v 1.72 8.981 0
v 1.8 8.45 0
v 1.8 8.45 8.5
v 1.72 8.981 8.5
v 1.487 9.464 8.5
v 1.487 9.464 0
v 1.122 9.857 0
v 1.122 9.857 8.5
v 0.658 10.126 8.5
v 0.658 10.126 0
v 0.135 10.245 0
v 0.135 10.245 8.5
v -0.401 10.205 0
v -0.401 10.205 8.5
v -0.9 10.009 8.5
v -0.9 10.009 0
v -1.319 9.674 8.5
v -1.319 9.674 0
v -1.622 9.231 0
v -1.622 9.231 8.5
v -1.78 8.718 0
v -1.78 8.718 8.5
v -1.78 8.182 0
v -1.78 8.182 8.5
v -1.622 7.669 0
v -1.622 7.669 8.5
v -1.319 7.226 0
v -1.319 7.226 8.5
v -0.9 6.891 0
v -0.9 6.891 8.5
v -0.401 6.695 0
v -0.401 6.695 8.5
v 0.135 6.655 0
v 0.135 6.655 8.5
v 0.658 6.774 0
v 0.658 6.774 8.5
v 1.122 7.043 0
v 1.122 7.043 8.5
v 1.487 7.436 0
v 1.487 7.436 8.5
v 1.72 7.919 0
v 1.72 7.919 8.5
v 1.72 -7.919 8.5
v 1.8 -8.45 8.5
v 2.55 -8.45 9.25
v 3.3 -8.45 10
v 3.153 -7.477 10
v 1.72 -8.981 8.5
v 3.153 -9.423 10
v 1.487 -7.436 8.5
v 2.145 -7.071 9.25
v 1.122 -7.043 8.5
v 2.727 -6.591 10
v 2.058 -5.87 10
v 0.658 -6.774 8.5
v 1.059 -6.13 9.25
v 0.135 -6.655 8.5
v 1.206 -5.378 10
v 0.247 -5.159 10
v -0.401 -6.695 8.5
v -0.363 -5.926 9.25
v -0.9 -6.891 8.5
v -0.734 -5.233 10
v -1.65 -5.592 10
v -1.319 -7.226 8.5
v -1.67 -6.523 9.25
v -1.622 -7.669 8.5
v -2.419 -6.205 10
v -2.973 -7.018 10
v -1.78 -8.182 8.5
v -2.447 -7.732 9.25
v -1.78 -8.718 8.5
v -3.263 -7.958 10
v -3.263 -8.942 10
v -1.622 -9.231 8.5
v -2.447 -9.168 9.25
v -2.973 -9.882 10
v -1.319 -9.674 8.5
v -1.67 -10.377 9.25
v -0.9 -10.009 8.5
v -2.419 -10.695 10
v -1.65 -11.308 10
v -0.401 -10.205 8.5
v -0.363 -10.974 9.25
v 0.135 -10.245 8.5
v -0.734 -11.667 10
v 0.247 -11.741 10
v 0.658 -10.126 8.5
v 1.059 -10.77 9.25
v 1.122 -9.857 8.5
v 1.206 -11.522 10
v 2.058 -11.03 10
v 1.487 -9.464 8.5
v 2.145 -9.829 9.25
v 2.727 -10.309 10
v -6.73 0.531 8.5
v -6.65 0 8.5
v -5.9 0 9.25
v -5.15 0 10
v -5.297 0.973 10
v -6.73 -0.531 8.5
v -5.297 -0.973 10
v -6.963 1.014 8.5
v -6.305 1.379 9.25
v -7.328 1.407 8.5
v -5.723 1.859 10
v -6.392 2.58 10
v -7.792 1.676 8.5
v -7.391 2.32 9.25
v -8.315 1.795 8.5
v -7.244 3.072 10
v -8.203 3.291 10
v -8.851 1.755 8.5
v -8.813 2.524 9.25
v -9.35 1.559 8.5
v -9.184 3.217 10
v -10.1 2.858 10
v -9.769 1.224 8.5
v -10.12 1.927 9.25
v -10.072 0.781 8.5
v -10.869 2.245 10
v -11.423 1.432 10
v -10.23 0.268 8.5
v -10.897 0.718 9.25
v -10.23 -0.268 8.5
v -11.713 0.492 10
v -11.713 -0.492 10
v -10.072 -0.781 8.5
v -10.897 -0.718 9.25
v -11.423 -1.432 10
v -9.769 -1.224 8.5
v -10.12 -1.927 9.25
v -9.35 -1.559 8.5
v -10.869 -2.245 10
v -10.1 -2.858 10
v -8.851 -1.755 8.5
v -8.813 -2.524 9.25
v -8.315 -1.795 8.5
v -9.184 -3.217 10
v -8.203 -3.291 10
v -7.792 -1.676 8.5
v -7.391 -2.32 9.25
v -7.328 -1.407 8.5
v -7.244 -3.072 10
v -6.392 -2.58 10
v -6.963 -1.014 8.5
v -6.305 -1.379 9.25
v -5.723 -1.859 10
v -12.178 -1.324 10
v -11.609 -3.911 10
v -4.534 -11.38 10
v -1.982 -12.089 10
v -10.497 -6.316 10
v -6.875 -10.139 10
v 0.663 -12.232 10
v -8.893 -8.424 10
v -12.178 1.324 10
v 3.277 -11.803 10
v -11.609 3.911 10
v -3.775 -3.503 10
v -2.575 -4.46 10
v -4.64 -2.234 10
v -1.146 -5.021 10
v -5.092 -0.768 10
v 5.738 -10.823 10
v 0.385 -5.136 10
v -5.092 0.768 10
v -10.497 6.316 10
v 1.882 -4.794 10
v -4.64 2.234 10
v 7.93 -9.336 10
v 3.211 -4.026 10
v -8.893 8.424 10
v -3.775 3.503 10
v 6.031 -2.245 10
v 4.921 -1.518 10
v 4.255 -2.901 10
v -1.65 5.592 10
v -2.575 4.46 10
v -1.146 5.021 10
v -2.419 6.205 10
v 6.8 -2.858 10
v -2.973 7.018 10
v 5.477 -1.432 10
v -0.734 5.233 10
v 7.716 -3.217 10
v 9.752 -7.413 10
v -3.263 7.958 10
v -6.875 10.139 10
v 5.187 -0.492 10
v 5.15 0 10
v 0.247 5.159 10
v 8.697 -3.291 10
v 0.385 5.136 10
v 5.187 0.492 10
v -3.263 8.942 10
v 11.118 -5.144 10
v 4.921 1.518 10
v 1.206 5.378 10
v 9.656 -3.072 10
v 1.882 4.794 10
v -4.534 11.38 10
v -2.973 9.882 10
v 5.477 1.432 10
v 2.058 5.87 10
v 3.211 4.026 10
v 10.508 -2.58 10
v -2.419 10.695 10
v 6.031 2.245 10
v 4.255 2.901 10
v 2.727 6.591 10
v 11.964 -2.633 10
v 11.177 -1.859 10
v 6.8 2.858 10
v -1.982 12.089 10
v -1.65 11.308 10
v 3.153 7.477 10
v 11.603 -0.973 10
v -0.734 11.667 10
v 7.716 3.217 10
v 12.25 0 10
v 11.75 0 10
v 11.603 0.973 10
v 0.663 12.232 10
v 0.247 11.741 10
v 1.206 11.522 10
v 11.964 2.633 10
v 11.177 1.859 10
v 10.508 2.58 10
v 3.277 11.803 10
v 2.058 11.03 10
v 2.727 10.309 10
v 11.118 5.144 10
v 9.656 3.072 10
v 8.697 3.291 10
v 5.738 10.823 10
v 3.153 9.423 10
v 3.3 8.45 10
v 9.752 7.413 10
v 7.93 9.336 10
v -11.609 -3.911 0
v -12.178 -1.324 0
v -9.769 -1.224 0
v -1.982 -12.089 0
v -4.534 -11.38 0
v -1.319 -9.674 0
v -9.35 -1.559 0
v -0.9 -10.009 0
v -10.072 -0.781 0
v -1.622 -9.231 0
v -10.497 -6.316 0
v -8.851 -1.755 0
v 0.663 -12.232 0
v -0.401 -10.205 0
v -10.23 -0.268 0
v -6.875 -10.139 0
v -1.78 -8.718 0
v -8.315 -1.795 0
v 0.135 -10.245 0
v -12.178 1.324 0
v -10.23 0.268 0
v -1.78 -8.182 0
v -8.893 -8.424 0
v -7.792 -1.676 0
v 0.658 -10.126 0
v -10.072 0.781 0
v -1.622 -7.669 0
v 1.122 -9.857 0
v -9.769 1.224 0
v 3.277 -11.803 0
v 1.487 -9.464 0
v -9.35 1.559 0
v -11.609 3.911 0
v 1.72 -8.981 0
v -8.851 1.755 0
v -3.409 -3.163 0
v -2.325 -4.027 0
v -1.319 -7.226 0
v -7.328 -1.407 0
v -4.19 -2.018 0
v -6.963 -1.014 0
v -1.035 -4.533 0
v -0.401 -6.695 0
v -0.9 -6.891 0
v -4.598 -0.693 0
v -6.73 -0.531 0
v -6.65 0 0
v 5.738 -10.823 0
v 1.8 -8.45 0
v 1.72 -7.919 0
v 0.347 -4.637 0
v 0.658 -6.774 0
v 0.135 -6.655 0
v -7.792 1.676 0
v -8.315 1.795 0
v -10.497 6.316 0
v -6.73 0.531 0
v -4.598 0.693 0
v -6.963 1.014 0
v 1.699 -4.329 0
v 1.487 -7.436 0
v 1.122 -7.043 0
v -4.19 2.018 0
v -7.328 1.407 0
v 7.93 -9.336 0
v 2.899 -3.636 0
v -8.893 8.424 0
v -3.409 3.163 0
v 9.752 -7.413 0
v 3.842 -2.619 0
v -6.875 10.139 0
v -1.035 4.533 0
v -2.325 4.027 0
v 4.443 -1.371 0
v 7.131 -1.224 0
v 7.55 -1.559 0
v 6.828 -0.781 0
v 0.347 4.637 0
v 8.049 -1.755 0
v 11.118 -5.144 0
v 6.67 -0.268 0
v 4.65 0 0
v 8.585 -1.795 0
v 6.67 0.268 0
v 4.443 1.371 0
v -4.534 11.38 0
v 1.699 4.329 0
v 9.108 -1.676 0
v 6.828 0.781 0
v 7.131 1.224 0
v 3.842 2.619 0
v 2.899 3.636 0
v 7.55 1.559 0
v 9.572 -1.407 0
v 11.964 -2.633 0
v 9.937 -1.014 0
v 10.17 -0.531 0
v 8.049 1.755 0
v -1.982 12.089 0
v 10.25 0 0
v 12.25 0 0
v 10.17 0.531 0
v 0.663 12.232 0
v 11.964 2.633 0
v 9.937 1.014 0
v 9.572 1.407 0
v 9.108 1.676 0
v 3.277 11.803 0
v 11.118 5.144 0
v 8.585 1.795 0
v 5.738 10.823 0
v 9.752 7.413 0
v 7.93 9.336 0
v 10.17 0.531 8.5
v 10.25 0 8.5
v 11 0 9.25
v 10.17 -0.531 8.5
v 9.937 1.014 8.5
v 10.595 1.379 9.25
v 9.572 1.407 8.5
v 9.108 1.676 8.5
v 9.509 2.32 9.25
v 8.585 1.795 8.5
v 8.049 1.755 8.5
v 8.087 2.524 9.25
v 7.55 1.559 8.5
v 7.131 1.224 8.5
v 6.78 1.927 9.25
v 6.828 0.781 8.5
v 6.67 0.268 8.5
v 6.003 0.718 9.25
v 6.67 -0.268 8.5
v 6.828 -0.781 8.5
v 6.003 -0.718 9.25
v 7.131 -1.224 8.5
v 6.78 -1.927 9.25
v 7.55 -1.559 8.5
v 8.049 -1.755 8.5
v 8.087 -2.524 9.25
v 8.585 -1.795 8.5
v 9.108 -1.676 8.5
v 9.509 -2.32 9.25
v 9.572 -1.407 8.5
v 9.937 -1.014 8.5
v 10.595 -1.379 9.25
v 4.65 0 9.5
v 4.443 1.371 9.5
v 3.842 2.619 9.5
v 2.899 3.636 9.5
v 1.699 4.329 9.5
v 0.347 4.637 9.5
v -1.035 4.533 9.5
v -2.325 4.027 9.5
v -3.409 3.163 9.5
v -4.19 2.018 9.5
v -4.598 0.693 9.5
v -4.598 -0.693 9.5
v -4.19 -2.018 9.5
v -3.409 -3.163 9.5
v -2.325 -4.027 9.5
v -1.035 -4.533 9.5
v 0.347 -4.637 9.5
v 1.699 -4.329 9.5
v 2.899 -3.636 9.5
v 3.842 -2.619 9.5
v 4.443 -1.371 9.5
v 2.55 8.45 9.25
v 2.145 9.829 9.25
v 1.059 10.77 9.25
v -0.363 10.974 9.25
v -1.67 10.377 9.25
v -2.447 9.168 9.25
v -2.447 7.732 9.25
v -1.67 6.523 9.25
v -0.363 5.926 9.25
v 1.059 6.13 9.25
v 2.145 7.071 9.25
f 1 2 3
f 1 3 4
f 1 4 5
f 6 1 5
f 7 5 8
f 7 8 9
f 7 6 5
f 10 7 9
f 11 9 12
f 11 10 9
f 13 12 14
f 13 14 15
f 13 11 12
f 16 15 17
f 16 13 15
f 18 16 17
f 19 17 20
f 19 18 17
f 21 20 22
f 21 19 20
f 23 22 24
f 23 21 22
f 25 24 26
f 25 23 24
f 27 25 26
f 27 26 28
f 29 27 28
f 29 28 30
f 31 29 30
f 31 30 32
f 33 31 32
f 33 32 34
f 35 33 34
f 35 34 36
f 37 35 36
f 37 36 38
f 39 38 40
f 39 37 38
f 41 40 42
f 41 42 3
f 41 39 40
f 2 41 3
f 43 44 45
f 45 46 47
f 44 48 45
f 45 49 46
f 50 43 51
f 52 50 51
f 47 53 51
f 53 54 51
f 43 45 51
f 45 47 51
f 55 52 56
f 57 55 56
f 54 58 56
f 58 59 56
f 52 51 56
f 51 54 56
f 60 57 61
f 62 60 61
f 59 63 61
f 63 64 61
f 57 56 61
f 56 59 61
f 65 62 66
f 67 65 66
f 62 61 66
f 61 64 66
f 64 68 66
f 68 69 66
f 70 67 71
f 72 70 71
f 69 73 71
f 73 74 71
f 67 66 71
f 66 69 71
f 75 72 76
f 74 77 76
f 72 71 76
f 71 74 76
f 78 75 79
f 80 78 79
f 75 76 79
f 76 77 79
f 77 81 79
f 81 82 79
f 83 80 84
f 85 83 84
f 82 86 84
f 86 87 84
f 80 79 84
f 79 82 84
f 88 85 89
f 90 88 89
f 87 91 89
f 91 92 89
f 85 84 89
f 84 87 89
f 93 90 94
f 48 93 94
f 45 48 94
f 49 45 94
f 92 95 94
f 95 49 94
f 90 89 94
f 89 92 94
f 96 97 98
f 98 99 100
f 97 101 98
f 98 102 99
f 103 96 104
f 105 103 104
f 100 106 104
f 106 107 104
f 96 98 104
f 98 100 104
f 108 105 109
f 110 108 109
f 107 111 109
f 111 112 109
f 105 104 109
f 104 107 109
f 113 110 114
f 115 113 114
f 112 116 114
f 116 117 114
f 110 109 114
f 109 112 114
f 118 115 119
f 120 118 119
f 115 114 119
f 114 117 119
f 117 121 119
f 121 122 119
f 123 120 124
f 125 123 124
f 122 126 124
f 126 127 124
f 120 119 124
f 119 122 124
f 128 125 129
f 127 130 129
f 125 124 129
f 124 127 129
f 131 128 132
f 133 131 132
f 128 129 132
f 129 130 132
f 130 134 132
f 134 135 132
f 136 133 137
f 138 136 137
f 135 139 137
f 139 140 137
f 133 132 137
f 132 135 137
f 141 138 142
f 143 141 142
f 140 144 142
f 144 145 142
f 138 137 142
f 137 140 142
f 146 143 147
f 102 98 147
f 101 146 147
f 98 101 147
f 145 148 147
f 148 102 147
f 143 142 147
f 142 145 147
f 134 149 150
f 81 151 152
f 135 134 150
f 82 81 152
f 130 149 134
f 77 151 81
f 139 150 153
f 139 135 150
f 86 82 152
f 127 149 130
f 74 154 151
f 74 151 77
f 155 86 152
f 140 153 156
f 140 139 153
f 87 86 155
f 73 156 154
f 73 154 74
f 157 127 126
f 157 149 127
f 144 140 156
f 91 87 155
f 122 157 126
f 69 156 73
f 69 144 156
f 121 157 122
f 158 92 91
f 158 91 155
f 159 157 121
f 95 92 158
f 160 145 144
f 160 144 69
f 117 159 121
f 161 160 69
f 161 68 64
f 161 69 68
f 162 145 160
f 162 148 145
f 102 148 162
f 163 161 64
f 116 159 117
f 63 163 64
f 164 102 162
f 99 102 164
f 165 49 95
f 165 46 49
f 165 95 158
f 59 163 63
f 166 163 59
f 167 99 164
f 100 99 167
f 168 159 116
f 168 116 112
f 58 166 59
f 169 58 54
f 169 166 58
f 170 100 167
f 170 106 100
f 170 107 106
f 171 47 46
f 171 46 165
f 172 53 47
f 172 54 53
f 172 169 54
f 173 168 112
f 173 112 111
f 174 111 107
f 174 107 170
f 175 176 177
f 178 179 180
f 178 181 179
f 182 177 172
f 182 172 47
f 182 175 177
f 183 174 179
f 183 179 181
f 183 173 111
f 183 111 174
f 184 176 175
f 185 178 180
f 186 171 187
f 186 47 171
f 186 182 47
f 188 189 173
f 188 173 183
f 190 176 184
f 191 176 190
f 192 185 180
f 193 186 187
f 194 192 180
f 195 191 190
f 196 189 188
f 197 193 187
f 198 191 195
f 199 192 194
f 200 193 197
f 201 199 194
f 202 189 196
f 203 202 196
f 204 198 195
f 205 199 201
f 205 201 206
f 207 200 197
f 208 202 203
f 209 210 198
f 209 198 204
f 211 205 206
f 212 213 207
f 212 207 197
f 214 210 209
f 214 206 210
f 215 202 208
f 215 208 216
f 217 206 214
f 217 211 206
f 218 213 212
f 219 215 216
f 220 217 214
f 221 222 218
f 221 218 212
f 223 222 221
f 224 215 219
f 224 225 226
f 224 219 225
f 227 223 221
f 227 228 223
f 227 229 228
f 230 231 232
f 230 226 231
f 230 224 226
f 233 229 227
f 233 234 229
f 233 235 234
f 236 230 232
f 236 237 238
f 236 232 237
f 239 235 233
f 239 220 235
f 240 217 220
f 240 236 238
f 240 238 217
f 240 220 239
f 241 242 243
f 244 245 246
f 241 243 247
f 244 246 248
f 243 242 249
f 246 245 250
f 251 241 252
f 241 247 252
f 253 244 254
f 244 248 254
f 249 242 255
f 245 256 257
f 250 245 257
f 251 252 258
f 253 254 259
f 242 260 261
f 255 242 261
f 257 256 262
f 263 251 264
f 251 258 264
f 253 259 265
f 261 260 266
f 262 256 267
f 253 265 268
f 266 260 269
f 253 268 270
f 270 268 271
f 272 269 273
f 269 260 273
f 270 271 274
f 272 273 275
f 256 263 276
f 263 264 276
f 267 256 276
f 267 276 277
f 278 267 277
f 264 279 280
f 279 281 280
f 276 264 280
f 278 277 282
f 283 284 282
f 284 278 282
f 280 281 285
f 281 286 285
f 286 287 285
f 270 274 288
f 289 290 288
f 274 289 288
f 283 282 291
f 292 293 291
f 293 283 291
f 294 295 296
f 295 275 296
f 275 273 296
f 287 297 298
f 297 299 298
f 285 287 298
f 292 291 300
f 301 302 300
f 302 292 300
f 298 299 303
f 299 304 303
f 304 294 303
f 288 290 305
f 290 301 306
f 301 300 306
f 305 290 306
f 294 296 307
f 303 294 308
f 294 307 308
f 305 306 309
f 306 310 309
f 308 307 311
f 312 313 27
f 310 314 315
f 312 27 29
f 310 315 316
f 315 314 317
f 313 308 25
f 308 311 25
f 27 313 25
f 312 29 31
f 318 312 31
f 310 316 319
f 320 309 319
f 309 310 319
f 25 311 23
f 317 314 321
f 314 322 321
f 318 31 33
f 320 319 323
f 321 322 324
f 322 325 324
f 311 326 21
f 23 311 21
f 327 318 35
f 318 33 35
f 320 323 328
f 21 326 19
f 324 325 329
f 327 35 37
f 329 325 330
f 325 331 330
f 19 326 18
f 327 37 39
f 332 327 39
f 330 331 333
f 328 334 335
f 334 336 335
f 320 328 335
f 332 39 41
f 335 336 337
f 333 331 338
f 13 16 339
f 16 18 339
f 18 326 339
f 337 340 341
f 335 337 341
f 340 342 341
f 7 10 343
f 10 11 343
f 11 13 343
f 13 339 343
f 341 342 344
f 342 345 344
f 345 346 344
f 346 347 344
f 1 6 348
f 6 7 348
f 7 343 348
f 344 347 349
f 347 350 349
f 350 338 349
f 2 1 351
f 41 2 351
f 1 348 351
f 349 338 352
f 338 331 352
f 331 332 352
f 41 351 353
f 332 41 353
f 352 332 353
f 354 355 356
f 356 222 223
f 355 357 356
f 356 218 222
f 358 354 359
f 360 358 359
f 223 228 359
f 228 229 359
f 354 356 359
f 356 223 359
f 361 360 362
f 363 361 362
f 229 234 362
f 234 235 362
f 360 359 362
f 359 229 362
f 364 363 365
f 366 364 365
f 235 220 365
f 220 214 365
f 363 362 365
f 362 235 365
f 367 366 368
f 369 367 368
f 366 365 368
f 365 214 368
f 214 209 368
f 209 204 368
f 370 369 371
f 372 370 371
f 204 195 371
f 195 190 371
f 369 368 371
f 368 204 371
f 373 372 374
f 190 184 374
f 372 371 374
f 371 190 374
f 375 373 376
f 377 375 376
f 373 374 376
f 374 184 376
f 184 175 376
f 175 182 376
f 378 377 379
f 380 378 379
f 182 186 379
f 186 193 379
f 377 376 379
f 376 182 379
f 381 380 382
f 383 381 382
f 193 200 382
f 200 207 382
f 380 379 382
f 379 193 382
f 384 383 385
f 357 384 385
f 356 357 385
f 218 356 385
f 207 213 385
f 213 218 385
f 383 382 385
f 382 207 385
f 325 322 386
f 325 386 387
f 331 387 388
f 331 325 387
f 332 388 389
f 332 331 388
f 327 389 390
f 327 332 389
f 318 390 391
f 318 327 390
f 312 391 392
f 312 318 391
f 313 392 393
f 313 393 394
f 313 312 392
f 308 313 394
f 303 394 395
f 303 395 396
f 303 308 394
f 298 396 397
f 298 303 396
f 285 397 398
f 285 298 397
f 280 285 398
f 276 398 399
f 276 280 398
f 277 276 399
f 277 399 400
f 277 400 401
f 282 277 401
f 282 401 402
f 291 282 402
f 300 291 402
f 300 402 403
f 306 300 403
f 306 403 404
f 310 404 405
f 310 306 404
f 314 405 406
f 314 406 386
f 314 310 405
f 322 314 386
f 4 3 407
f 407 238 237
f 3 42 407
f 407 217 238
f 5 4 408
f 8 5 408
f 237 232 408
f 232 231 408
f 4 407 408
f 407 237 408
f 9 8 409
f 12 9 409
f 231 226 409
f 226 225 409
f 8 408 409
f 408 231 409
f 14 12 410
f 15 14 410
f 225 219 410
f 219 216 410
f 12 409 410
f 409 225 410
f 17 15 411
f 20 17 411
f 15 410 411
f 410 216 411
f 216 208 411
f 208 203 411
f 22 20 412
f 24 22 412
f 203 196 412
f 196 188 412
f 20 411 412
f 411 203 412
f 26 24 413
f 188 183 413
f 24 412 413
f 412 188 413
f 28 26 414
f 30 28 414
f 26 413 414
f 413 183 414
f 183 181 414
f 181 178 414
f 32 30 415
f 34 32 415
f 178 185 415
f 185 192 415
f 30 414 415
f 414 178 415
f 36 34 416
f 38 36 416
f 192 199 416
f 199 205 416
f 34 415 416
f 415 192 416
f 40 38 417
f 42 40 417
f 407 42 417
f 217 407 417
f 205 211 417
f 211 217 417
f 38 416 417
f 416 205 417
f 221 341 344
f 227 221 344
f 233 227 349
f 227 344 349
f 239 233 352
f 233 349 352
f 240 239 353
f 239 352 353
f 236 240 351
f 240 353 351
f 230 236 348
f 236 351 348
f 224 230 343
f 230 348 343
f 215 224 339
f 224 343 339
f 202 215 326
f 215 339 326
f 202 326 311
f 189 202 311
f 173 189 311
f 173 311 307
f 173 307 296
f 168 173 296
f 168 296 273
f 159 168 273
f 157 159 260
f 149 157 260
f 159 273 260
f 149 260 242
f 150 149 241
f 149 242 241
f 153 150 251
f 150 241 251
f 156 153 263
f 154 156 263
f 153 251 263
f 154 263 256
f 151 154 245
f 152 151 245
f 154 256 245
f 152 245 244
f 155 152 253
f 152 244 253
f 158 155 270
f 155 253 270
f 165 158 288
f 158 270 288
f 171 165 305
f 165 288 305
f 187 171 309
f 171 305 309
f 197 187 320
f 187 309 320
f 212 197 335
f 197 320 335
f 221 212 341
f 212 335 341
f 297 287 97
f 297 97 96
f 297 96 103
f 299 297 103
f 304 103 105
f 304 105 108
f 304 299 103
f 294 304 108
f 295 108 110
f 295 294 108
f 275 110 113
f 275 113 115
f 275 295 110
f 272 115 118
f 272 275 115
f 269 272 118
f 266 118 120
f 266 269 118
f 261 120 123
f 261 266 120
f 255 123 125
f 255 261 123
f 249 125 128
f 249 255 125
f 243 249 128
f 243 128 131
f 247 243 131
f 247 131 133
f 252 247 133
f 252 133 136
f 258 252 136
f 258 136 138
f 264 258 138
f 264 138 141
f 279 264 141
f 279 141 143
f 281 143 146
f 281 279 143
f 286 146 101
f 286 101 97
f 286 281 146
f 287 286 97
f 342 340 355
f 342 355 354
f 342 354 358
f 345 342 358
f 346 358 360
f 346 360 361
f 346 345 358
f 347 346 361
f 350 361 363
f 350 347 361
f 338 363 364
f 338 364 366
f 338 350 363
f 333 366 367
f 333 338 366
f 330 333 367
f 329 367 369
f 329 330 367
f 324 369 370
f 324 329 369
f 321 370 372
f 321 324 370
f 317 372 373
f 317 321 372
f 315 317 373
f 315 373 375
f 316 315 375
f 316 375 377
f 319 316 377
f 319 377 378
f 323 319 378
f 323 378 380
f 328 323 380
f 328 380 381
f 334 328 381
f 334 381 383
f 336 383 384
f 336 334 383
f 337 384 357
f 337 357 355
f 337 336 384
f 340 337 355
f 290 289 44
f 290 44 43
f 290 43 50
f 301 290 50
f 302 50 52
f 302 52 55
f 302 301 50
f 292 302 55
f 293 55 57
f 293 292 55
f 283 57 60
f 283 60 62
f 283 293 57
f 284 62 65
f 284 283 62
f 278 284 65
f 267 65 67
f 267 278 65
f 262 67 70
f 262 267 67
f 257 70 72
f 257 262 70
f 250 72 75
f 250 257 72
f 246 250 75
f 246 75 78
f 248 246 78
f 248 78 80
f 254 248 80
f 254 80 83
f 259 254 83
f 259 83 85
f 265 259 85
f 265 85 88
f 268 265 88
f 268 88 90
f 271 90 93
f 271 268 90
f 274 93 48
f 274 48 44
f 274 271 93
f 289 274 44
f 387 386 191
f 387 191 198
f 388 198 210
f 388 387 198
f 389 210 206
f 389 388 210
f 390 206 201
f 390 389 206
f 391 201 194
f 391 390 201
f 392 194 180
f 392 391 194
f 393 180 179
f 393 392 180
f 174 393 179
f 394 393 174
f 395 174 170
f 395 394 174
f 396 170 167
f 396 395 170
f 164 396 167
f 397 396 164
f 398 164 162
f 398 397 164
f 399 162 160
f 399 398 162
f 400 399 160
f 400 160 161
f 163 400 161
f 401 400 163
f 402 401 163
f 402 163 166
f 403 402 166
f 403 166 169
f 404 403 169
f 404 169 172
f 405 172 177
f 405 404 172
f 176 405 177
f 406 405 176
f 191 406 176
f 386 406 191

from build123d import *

# Parameters (mm, degrees)
F0_R     = 12.25
F0_R_2   = 1.8
F0_R_3   = 4.65
F1_DEPTH = 10
F2_SIZE  = 1.5
F3_SIZE  = 0.49999


# Not quite as in the source:
# - a fillet or chamfer is up to 0.001 mm smaller than in the source, because OpenCascade refuses the exact size


with BuildPart() as f1:
    # F0 (on Top) → F1 (new body)
    with BuildSketch(Plane.XY):
        Circle(F0_R)
        with Locations((0, -8.45)):
            Circle(F0_R_2, mode=Mode.SUBTRACT)
        with Locations((-8.45, 0)):
            Circle(F0_R_2, mode=Mode.SUBTRACT)
        Circle(F0_R_3, mode=Mode.SUBTRACT)
        with Locations((8.45, 0)):
            Circle(F0_R_2, mode=Mode.SUBTRACT)
        with Locations((0, 8.45)):
            Circle(F0_R_2, mode=Mode.SUBTRACT)
    extrude(amount=F1_DEPTH)

    # F2
    f2_edges = [f1.edges().sort_by_distance(p)[0] for p in [
        (-10.25, 0, 10),
        (-1.8, 8.45, 10),
        (6.65, 0, 10),
        (-1.8, -8.45, 10),
    ]]
    chamfer(f2_edges, length=F2_SIZE)

    # F3 (size 0.5 in the source; OpenCascade refuses exactly that, so slightly less here)
    f3_edges = [f1.edges().sort_by_distance(p)[0] for p in [
        (-4.65, 0, 10),
    ]]
    chamfer(f3_edges, length=F3_SIZE)


solid = f1.part
